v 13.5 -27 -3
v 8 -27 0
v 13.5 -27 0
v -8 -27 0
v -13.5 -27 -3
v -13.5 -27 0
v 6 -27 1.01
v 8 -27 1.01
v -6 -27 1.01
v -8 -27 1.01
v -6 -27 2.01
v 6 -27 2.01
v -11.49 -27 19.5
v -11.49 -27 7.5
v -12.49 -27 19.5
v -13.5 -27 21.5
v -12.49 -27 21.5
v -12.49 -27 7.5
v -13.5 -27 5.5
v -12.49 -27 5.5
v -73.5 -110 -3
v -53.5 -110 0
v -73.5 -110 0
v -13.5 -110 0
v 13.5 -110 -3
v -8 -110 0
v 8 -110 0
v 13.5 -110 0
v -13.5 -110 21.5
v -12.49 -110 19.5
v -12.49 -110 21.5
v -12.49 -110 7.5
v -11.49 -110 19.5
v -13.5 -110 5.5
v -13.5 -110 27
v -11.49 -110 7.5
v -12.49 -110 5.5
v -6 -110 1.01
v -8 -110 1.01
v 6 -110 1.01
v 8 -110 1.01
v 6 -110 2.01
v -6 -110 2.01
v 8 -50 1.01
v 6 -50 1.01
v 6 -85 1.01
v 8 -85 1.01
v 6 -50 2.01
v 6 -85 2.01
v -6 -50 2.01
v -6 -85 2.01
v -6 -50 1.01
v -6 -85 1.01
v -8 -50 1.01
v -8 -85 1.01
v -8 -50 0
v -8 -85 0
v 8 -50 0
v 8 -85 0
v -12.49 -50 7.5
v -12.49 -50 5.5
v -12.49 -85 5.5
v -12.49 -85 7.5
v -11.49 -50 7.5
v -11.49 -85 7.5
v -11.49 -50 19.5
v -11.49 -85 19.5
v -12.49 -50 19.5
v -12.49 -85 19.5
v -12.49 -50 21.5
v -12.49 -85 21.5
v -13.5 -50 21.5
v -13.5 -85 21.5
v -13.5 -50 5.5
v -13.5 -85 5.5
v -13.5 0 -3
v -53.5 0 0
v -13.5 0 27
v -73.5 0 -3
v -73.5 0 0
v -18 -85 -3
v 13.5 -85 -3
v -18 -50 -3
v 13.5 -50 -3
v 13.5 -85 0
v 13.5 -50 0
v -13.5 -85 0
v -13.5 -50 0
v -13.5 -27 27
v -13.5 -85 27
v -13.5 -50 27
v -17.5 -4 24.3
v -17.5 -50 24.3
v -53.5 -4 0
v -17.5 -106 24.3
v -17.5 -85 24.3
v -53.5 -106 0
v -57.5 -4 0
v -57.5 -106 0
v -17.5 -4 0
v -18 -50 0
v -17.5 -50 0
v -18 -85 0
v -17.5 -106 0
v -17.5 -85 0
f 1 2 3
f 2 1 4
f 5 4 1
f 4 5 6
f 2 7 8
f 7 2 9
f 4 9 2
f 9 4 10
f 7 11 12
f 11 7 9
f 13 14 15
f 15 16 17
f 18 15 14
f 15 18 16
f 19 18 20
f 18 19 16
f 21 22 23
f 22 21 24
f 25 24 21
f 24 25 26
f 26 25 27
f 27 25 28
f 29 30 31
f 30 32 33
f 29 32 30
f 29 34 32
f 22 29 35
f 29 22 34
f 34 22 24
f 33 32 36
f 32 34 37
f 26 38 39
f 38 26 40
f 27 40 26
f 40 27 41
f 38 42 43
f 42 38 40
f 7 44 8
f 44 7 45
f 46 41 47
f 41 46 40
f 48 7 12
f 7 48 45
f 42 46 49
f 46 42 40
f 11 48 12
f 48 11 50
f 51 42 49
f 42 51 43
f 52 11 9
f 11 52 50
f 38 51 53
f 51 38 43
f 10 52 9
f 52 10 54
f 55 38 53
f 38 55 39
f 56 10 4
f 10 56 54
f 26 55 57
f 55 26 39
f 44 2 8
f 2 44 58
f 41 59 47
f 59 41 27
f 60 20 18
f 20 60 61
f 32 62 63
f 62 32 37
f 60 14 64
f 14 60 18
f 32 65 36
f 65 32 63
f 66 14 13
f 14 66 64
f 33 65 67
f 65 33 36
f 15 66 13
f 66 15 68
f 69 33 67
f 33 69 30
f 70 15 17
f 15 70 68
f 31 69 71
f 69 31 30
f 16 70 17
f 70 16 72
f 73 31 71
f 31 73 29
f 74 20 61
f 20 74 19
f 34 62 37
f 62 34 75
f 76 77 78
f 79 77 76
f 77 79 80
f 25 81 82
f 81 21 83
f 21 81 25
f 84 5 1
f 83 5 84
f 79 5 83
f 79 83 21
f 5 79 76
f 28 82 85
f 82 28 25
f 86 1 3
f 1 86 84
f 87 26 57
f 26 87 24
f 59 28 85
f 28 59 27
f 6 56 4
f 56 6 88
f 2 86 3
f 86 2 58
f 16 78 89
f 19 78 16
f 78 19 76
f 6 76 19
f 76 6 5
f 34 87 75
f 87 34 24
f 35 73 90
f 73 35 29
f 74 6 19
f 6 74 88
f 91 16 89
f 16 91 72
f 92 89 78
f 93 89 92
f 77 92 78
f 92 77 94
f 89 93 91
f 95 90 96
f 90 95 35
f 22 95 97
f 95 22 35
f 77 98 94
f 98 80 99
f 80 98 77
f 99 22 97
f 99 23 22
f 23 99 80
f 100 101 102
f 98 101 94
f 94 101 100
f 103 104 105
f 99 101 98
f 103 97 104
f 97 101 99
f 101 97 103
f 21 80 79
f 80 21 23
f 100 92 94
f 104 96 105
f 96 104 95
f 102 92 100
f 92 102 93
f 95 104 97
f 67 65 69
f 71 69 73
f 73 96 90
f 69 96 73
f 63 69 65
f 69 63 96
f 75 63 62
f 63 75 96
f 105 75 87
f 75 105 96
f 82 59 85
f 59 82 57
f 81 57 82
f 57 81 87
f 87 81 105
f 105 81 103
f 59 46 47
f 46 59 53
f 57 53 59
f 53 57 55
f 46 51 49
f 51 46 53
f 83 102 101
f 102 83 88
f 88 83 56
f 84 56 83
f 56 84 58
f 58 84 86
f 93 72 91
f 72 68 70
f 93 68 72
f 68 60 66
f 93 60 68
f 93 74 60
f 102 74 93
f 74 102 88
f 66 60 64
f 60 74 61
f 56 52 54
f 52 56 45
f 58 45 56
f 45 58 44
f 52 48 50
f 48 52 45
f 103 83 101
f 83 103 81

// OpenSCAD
// file: includes/k8200_rail.scad
module k8200_rail(){
    translate([0,-0.5])
    union(){
        linear_extrude(rlen){
            translate([0,1])square([16,1.02],center=true);
            translate([0,2])square([12,1.02],center=true);
        }
    }
}

module k8200_rail_dual(){
    translate([0,0,0])k8200_rail(rlen=rlen);
    translate([-13.5,13.5,0])rotate([0,0,-90])k8200_rail(rlen=rlen);
}

module k8200_rail_profile(){
    k=8;
    difference(){
        minkowski(){
            translate([k/2,k/2,0])cylinder(d=k,h=rlen/2,$fn=30);
            translate([-26.999/2,0,0])cube([26.999-k,26.999-k,rlen/2]);
        }
        #k8200_rail_dual(rlen=40);
        rotate([0,0,180])translate([0,-27,0])k8200_rail_dual(rlen=40);
    }
}

//k8200_rail(rlen=40);
//k8200_rail_dual(rlen=40);
//k8200_rail_profile(rlen=40);
// file: includes/config.scad
$fn=32;

nema_size_x = 42.3;
nema_size_y = 42.3;
nema_screw = 4;
nema_screw_cap = 8;
nema_hole_spacing = 31;
nema_center_hole = 22;

x = 27.35; //bolt hole spacing
y = 45;

X_rod_diameter = 10;
Y_rod_diameter = 8;
Z_rod_diameter = 10; //smooth rod

Z_bearing_dia = 15;
Z_bearing_h = 25;

block_bolt_size = 4;
block_bolt_head = 9;
z_nut = 13;
z_rod = 8; //threaded rod
z_motor_bolt = 5.5;
d_spacer=12;
d_bolt=5;
clearance = 0.25;
// file: includes/adjustments.scad
//these two are needed otherwise you need to put them in
//if you forget it'll complain about unknown variables.
$fn=32;
center=false;

module nut()
{
cylinder(d=(2*(tan(30)*nut_size)),h=nut_h, center=center, $fn=6); // don't do anything here
    //echo ("point to point:"); // this just echoes
    //echo ((tan(30)*nut_size)*2); //the diameter of a circle that will encompass the exterior of the hexagonal shape.
}

module hole()
{ 

    //hole = size of the hole
    //h = height
    cylinder(d=(hole_dia+(hole_dia-(cos(360 / (2*$fn)) * hole_dia) )),h=h,center=center,$fn=$fn); 
    //echo ("real hole diameter");
    //echo ((hole_dia+(hole_dia-(cos(360 / (2*$fn)) * hole_dia) )));
}
// main file
$fn=32;
include <includes/adjustments.scad>
include <includes/config.scad>
include <includes/k8200_rail.scad>

//size of the PSU, most of it is just for reference as only the width is used
psu_length = 200;
psu_width = 110;
psu_height = 50;

rlen = psu_width-27;//-27 because it hangs over a bit of the extrusion that runs 90 degrees

rotate([90,0])
difference(){
    union(){
        color("blue")translate([0,0,27])k8200_rail_dual(); //bit that clips into the extrusions

        color("red")linear_extrude(psu_width){ //support brace triangle + flat upright
            polygon(
                points = [[-13.5,0],[-13.5,27],[-13.5-40,0]]);
                
            polygon(
                points = [[13.5,0],[13.5,-3],[-13.5-60,-3],[-13.5-60,0]]);
        }
    }   
    color("green")translate([-4,0,4])linear_extrude(psu_width-8)//the back brace support triangle cutout
        polygon(
            points = [[-13.5,0],[-13.5,27],[-13.5-40,0]]);
    //below can be removed for extra strength, cutouts just to try to lessen the print time/material used
        translate([-18,-6,50])cube([50,50,psu_width-75]);
        translate([-13.5,-6,0])cube([50,50,27]);
}
    


//k8200_rail_profile();
